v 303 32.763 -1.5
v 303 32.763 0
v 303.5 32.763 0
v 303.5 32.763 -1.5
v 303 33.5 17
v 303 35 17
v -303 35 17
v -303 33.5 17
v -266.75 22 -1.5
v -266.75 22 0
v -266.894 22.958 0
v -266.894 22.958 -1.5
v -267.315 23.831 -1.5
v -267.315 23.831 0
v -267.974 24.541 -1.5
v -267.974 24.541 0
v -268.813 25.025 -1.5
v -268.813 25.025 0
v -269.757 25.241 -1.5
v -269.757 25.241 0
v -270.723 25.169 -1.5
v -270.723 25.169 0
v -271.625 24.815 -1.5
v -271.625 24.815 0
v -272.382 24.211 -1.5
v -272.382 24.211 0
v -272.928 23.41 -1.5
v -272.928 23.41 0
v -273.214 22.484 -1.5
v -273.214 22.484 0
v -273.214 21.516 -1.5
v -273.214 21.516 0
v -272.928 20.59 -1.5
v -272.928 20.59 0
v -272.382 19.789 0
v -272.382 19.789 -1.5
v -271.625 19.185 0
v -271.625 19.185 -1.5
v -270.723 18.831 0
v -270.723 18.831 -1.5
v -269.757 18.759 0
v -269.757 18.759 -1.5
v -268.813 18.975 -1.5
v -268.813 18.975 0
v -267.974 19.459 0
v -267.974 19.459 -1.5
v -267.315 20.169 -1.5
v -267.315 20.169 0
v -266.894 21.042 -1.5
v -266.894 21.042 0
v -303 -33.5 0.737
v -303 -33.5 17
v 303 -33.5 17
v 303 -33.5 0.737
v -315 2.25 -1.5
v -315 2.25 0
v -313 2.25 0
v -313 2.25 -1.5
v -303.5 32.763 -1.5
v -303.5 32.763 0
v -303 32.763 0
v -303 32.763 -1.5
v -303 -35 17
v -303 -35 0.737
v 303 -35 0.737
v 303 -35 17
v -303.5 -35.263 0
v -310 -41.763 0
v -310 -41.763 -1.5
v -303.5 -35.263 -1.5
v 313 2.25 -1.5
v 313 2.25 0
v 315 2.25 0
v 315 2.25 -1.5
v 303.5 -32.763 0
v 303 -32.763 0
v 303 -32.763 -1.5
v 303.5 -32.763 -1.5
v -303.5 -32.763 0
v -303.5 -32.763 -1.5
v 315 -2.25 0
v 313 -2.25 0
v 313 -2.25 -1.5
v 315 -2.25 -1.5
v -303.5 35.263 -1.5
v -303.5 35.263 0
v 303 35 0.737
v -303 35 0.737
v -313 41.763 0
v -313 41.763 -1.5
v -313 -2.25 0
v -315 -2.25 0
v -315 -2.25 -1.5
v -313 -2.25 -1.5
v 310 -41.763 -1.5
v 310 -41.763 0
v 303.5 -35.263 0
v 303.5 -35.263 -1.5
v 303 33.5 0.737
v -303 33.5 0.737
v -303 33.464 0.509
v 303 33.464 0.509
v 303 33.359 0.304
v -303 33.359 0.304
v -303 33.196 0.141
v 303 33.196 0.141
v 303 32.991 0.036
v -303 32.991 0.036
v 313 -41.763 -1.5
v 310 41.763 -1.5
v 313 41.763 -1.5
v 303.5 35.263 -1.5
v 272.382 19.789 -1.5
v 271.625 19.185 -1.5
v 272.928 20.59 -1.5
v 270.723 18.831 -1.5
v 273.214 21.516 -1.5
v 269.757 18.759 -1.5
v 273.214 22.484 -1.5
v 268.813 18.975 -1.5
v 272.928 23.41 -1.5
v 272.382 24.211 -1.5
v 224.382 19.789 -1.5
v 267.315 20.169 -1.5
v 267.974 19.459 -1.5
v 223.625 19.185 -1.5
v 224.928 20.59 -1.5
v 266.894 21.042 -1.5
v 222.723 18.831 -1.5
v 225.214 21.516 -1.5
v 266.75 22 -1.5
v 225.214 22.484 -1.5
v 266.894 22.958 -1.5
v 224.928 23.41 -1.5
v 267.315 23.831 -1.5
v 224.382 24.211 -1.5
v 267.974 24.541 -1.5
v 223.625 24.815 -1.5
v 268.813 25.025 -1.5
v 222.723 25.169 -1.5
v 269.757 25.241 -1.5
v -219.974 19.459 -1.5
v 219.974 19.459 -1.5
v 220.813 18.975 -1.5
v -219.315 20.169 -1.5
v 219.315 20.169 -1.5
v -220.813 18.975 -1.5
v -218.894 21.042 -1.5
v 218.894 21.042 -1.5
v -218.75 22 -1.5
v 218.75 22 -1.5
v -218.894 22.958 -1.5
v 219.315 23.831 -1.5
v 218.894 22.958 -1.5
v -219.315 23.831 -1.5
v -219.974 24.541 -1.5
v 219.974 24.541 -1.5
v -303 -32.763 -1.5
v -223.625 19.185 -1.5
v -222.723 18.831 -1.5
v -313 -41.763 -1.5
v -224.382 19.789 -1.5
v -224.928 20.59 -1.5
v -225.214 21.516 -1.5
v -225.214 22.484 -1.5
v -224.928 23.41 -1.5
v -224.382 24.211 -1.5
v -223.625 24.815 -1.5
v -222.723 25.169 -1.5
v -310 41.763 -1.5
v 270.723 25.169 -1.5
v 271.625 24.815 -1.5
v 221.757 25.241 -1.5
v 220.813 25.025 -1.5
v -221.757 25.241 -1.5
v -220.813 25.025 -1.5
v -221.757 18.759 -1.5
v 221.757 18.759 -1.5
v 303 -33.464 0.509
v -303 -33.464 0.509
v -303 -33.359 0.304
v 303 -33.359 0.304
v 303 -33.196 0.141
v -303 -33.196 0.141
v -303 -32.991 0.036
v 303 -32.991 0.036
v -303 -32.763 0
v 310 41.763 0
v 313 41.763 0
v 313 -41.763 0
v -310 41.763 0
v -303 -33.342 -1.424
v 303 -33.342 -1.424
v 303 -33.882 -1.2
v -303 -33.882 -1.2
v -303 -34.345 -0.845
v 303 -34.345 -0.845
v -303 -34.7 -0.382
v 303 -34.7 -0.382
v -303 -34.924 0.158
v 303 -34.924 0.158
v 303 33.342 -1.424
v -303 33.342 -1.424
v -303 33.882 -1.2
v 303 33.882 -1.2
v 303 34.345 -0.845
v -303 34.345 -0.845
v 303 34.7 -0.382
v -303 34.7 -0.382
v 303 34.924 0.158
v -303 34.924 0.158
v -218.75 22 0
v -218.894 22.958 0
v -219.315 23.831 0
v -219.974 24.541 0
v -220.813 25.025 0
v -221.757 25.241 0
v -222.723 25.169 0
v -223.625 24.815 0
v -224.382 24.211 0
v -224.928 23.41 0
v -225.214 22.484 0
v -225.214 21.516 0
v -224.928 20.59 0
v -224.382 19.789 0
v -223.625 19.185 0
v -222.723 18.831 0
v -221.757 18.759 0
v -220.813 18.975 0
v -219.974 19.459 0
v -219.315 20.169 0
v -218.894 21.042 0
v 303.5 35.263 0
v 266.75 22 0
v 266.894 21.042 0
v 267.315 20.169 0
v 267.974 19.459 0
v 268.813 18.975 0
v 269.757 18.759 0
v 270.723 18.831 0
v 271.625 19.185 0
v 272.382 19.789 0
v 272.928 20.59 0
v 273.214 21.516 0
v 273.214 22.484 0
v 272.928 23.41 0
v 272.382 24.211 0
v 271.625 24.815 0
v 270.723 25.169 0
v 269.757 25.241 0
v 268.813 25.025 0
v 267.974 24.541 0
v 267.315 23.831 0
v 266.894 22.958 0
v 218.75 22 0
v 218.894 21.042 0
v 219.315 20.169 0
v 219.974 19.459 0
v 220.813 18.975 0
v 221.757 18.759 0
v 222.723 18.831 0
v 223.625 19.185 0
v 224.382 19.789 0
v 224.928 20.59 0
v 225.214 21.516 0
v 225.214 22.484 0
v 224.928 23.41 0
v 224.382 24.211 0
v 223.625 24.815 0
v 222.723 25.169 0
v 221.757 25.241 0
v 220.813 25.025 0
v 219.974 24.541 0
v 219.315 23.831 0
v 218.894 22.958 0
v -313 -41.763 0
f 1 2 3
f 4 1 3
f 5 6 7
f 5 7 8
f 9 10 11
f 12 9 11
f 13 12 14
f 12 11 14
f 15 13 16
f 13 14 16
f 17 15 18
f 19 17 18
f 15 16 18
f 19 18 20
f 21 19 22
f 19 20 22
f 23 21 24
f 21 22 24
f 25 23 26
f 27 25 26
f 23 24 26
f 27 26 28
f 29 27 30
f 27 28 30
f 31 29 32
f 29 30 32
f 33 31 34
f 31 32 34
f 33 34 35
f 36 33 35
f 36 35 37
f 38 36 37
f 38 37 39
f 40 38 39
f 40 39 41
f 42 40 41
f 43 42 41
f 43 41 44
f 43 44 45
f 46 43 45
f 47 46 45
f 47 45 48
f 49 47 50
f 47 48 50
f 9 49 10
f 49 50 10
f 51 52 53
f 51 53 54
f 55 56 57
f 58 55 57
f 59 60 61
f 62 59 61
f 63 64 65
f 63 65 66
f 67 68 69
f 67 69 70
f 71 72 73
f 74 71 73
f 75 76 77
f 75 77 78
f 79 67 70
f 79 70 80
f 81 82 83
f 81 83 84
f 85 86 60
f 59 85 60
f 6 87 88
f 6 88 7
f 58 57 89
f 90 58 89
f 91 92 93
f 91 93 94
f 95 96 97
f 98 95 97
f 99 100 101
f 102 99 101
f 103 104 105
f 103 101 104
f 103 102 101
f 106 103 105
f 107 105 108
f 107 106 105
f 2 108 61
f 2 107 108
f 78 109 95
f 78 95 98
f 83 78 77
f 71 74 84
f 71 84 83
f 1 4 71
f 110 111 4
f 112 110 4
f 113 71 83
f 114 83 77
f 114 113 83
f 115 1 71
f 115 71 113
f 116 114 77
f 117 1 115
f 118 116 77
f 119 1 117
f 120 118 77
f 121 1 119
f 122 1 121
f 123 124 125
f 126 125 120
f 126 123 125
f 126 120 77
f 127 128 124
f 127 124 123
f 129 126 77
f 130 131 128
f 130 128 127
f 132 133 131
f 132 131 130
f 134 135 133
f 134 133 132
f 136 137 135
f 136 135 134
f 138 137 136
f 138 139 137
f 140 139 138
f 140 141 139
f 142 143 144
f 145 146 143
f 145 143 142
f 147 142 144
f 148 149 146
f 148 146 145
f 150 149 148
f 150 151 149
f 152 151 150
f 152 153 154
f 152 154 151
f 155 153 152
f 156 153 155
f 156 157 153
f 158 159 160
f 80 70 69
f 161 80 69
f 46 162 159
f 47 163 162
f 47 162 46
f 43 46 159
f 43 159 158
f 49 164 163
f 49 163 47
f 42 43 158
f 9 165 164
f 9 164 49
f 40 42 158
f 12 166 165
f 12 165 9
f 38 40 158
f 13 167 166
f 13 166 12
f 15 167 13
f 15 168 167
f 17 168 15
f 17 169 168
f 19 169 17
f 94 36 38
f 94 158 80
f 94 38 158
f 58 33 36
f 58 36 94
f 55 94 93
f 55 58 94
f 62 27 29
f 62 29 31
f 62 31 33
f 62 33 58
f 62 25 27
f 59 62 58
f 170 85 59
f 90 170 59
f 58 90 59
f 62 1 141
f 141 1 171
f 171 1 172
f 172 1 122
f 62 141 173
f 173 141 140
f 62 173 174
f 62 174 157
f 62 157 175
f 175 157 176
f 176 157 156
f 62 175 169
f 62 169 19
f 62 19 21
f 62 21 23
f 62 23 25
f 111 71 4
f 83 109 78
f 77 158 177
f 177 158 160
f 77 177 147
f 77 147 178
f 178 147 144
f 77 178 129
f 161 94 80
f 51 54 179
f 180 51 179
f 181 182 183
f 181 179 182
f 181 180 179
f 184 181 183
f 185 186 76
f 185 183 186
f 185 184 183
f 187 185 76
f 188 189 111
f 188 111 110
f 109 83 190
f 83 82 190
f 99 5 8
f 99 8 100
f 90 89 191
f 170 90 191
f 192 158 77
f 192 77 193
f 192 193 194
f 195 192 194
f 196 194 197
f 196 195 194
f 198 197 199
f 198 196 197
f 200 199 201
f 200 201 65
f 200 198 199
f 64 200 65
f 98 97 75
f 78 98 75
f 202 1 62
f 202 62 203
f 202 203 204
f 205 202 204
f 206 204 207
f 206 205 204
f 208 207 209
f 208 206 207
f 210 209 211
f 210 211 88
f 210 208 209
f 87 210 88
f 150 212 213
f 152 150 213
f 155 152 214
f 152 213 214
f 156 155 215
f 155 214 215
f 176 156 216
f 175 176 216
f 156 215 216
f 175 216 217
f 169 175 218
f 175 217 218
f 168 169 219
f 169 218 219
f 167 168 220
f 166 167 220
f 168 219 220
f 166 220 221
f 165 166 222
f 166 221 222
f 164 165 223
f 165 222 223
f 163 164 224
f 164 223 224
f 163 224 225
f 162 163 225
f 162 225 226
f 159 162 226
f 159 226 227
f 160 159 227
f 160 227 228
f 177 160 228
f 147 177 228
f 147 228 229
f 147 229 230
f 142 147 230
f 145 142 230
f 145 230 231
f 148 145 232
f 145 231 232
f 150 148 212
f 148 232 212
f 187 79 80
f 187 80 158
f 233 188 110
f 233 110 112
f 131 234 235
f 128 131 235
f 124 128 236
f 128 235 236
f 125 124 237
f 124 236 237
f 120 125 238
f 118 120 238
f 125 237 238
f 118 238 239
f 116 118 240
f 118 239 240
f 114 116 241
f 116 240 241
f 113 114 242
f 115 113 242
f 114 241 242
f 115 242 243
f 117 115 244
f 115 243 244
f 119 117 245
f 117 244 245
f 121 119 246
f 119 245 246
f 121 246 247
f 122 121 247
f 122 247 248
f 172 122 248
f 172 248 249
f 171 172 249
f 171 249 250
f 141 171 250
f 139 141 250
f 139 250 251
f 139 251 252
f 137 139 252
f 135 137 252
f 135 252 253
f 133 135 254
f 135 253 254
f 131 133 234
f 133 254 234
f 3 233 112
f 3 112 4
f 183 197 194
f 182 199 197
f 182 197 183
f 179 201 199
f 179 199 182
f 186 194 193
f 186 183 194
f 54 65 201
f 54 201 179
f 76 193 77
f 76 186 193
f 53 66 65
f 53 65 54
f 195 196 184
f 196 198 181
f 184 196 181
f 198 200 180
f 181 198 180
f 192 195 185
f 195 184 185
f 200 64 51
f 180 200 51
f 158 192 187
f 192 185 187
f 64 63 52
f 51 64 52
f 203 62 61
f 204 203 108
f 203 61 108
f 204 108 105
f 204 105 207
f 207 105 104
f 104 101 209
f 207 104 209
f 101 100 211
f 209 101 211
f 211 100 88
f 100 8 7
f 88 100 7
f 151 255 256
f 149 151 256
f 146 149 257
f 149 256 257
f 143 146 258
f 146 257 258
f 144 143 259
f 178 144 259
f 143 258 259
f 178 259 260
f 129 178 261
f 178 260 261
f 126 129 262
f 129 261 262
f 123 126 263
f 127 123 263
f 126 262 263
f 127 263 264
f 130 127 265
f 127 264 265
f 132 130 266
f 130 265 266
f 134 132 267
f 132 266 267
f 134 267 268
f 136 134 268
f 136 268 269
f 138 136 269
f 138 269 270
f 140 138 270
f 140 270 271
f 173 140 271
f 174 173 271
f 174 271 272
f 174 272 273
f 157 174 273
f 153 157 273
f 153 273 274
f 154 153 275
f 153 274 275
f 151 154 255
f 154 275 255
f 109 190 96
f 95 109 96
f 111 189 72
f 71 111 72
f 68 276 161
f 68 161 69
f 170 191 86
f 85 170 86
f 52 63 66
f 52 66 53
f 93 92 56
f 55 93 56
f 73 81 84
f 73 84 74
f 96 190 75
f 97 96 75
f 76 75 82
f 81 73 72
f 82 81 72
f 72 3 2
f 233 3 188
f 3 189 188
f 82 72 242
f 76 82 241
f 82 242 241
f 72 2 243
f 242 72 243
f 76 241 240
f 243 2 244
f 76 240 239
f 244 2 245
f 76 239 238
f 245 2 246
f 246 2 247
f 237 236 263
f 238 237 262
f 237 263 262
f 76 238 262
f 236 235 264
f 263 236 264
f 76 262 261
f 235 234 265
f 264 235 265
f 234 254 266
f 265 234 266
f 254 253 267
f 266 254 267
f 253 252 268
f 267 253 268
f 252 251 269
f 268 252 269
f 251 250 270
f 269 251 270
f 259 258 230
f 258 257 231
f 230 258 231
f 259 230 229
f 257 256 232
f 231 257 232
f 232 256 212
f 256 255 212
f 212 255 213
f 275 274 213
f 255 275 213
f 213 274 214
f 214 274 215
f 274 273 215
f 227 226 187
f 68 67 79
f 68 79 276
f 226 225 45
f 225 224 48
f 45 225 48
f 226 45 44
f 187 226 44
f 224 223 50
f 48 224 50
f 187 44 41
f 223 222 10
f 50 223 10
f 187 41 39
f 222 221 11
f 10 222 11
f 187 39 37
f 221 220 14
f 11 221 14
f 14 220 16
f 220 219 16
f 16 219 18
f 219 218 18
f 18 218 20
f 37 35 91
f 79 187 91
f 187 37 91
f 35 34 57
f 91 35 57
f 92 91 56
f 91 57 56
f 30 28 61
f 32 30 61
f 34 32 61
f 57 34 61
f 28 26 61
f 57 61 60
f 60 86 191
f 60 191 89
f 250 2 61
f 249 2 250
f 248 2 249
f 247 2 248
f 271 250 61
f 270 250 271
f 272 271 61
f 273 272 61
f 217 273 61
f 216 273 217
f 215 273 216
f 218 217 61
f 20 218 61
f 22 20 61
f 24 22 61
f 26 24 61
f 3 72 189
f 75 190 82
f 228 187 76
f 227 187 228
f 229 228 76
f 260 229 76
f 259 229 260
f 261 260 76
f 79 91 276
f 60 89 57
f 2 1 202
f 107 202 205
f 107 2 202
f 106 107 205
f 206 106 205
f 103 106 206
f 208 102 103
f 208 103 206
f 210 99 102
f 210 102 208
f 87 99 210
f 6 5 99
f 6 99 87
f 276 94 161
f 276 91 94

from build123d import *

# Parameters (mm, degrees)
SKETCH_1_W                         = 626
SKETCH_1_H                         = 70
SM_BASE_FLANGE_1_DEPTH             = 1.5
SM_EDGE_FLANGE_1_STRIP_W           = 7.4732
SM_EDGE_FLANGE_1_STRIP_H           = 1.5
SM_EDGE_FLANGE_1_STRIP_CUT_DEPTH   = 626
SM_EDGE_FLANGE_1_STRIP_2_W         = 7.4732
SM_EDGE_FLANGE_1_STRIP_2_H         = 1.5
SM_EDGE_FLANGE_1_STRIP_CUT_2_DEPTH = 626
SM_EDGE_FLANGE_1_DEPTH             = 626
SM_EDGE_FLANGE_1_BEND_DEPTH        = 626
SKETCH_8_W                         = 2
SKETCH_8_H                         = 4.5
SM_BASE_FLANGE_1_2_DEPTH           = 1.5
CUT_EXTRUDE_1_REACH                = 319.478
SKETCH_11_W                        = 10
SKETCH_11_H                        = 2.2366
SM_BASE_FLANGE_2_DEPTH             = 1.5
SKETCH_13_R                        = 3.25
CUT_EXTRUDE_2_DEPTH                = 1.5


# Sheet-metal steps are written as plain solids
with BuildPart() as part:
    # Sketch 1 → Sm Base Flange 1 (new body)
    with BuildSketch(Plane.XY):
        Rectangle(SKETCH_1_W, SKETCH_1_H)
    extrude(amount=-SM_BASE_FLANGE_1_DEPTH)

    # Ребро-кромка1 strip (across the edge) → Ребро-кромка1 strip cut (cut)
    with BuildSketch(Plane(origin=(313, 35, 0), x_dir=(0, -1, 0), z_dir=(-1, 0, 0))):
        with Locations((-1.5, -0.75)):
            Rectangle(SM_EDGE_FLANGE_1_STRIP_W, SM_EDGE_FLANGE_1_STRIP_H)
    extrude(amount=SM_EDGE_FLANGE_1_STRIP_CUT_DEPTH, mode=Mode.SUBTRACT)

    # Ребро-кромка1 strip 2 (across the edge) → Ребро-кромка1 strip cut 2 (cut)
    with BuildSketch(Plane(origin=(-313, -35, 0), x_dir=(0, 1, 0), z_dir=(1, 0, 0))):
        with Locations((-1.5, -0.75)):
            Rectangle(SM_EDGE_FLANGE_1_STRIP_2_W, SM_EDGE_FLANGE_1_STRIP_2_H)
    extrude(amount=SM_EDGE_FLANGE_1_STRIP_CUT_2_DEPTH, mode=Mode.SUBTRACT)

    # Ребро-кромка1 section (across the edge) → Ребро-кромка1 (add)
    with BuildSketch(Plane(origin=(313, 35, 0), x_dir=(0, -1, 0), z_dir=(-1, 0, 0))):
        with BuildLine():
            Line((0, 0.7366), (0, 17))
            Line((0, 17), (1.5, 17))
            Line((1.5, 17), (1.5, 0.7366))
            ThreePointArc((1.5, 0.7366), (1.715745145, 0.215745145), (2.2366, 0))
            Line((2.2366, 0), (2.2366, -1.5))
            ThreePointArc((2.2366, -1.5), (0.655084973, -0.844915027), (0, 0.7366))
        make_face()
    extrude(amount=SM_EDGE_FLANGE_1_DEPTH)

    # Ребро-кромка1 section 2 (across the edge) → Ребро-кромка1 bend (add)
    with BuildSketch(Plane(origin=(-313, -35, 0), x_dir=(0, 1, 0), z_dir=(1, 0, 0))):
        with BuildLine():
            Line((0, 0.7366), (0, 17))
            Line((0, 17), (1.5, 17))
            Line((1.5, 17), (1.5, 0.7366))
            ThreePointArc((1.5, 0.7366), (1.715745145, 0.215745145), (2.2366, 0))
            Line((2.2366, 0), (2.2366, -1.5))
            ThreePointArc((2.2366, -1.5), (0.655084973, -0.844915027), (0, 0.7366))
        make_face()
    extrude(amount=SM_EDGE_FLANGE_1_BEND_DEPTH)

    # Эскиз8 → Sm Base Flange 1 2 (add)
    with BuildSketch(Plane.XY):
        with Locations((-314, 0)):
            Rectangle(SKETCH_8_W, SKETCH_8_H)
        with Locations((314, 0)):
            Rectangle(SKETCH_8_W, SKETCH_8_H)
    extrude(amount=-SM_BASE_FLANGE_1_2_DEPTH)

    # Эскиз11 → Вырез-Вытянуть1 (cut, up to next)
    with BuildSketch(Plane.XY.offset(17), mode=Mode.PRIVATE) as cut_extrude_1_sk1:
        with Locations((-308, 33.8817)):
            Rectangle(SKETCH_11_W, SKETCH_11_H)
    cut_extrude_1_tool1 = extrude(cut_extrude_1_sk1.sketch, amount=-CUT_EXTRUDE_1_REACH, mode=Mode.PRIVATE) & part.part
    # Эскиз11 → Вырез-Вытянуть1 (cut, up to next)
    with BuildSketch(Plane.XY.offset(17), mode=Mode.PRIVATE) as cut_extrude_1_sk2:
        with Locations((-308, -33.8817)):
            Rectangle(SKETCH_11_W, SKETCH_11_H)
    cut_extrude_1_tool2 = extrude(cut_extrude_1_sk2.sketch, amount=-CUT_EXTRUDE_1_REACH, mode=Mode.PRIVATE) & part.part
    # Эскиз11 → Вырез-Вытянуть1 (cut, up to next)
    with BuildSketch(Plane.XY.offset(17), mode=Mode.PRIVATE) as cut_extrude_1_sk3:
        with Locations((308, -33.8817)):
            Rectangle(SKETCH_11_W, SKETCH_11_H)
    cut_extrude_1_tool3 = extrude(cut_extrude_1_sk3.sketch, amount=-CUT_EXTRUDE_1_REACH, mode=Mode.PRIVATE) & part.part
    # Эскиз11 → Вырез-Вытянуть1 (cut, up to next)
    with BuildSketch(Plane.XY.offset(17), mode=Mode.PRIVATE) as cut_extrude_1_sk4:
        with Locations((308, 33.8817)):
            Rectangle(SKETCH_11_W, SKETCH_11_H)
    cut_extrude_1_tool4 = extrude(cut_extrude_1_sk4.sketch, amount=-CUT_EXTRUDE_1_REACH, mode=Mode.PRIVATE) & part.part
    add(cut_extrude_1_tool1.solids().sort_by_distance((-308, 33.8817, 17))[0], mode=Mode.SUBTRACT)
    add(cut_extrude_1_tool2.solids().sort_by_distance((-308, -33.8817, 17))[0], mode=Mode.SUBTRACT)
    add(cut_extrude_1_tool3.solids().sort_by_distance((308, -33.8817, 17))[0], mode=Mode.SUBTRACT)
    add(cut_extrude_1_tool4.solids().sort_by_distance((308, 33.8817, 17))[0], mode=Mode.SUBTRACT)

    # Эскиз12 → Выступ2 (add)
    with BuildSketch(Plane.XY):
        Polygon((-313, 32.7634), (-313, 41.7634), (-310, 41.7634), (-303.5, 35.2634), (-303.5, 32.7634), align=None)
        Polygon((-303.5, -32.7634), (-313, -32.7634), (-313, -41.7634), (-310, -41.7634), (-303.5, -35.2634), align=None)
        Polygon((313, -32.7634), (313, -41.7634), (310, -41.7634), (303.5, -35.2634), (303.5, -32.7634), align=None)
        Polygon((303.5, 32.7634), (313, 32.7634), (313, 41.7634), (310, 41.7634), (303.5, 35.2634), align=None)
    extrude(amount=-SM_BASE_FLANGE_2_DEPTH)

    # Эскиз13 → Вырез-Вытянуть2 (cut)
    with BuildSketch(Plane.XY):
        with Locations((-270, 22)):
            Circle(SKETCH_13_R)
        with Locations((-222, 22)):
            Circle(SKETCH_13_R)
        with Locations(Location((222, 22, 0), (0, 0, 180))):
            Circle(SKETCH_13_R)
        with Locations(Location((270, 22, 0), (0, 0, 180))):
            Circle(SKETCH_13_R)
    extrude(amount=-CUT_EXTRUDE_2_DEPTH, mode=Mode.SUBTRACT)


solid = part.part
